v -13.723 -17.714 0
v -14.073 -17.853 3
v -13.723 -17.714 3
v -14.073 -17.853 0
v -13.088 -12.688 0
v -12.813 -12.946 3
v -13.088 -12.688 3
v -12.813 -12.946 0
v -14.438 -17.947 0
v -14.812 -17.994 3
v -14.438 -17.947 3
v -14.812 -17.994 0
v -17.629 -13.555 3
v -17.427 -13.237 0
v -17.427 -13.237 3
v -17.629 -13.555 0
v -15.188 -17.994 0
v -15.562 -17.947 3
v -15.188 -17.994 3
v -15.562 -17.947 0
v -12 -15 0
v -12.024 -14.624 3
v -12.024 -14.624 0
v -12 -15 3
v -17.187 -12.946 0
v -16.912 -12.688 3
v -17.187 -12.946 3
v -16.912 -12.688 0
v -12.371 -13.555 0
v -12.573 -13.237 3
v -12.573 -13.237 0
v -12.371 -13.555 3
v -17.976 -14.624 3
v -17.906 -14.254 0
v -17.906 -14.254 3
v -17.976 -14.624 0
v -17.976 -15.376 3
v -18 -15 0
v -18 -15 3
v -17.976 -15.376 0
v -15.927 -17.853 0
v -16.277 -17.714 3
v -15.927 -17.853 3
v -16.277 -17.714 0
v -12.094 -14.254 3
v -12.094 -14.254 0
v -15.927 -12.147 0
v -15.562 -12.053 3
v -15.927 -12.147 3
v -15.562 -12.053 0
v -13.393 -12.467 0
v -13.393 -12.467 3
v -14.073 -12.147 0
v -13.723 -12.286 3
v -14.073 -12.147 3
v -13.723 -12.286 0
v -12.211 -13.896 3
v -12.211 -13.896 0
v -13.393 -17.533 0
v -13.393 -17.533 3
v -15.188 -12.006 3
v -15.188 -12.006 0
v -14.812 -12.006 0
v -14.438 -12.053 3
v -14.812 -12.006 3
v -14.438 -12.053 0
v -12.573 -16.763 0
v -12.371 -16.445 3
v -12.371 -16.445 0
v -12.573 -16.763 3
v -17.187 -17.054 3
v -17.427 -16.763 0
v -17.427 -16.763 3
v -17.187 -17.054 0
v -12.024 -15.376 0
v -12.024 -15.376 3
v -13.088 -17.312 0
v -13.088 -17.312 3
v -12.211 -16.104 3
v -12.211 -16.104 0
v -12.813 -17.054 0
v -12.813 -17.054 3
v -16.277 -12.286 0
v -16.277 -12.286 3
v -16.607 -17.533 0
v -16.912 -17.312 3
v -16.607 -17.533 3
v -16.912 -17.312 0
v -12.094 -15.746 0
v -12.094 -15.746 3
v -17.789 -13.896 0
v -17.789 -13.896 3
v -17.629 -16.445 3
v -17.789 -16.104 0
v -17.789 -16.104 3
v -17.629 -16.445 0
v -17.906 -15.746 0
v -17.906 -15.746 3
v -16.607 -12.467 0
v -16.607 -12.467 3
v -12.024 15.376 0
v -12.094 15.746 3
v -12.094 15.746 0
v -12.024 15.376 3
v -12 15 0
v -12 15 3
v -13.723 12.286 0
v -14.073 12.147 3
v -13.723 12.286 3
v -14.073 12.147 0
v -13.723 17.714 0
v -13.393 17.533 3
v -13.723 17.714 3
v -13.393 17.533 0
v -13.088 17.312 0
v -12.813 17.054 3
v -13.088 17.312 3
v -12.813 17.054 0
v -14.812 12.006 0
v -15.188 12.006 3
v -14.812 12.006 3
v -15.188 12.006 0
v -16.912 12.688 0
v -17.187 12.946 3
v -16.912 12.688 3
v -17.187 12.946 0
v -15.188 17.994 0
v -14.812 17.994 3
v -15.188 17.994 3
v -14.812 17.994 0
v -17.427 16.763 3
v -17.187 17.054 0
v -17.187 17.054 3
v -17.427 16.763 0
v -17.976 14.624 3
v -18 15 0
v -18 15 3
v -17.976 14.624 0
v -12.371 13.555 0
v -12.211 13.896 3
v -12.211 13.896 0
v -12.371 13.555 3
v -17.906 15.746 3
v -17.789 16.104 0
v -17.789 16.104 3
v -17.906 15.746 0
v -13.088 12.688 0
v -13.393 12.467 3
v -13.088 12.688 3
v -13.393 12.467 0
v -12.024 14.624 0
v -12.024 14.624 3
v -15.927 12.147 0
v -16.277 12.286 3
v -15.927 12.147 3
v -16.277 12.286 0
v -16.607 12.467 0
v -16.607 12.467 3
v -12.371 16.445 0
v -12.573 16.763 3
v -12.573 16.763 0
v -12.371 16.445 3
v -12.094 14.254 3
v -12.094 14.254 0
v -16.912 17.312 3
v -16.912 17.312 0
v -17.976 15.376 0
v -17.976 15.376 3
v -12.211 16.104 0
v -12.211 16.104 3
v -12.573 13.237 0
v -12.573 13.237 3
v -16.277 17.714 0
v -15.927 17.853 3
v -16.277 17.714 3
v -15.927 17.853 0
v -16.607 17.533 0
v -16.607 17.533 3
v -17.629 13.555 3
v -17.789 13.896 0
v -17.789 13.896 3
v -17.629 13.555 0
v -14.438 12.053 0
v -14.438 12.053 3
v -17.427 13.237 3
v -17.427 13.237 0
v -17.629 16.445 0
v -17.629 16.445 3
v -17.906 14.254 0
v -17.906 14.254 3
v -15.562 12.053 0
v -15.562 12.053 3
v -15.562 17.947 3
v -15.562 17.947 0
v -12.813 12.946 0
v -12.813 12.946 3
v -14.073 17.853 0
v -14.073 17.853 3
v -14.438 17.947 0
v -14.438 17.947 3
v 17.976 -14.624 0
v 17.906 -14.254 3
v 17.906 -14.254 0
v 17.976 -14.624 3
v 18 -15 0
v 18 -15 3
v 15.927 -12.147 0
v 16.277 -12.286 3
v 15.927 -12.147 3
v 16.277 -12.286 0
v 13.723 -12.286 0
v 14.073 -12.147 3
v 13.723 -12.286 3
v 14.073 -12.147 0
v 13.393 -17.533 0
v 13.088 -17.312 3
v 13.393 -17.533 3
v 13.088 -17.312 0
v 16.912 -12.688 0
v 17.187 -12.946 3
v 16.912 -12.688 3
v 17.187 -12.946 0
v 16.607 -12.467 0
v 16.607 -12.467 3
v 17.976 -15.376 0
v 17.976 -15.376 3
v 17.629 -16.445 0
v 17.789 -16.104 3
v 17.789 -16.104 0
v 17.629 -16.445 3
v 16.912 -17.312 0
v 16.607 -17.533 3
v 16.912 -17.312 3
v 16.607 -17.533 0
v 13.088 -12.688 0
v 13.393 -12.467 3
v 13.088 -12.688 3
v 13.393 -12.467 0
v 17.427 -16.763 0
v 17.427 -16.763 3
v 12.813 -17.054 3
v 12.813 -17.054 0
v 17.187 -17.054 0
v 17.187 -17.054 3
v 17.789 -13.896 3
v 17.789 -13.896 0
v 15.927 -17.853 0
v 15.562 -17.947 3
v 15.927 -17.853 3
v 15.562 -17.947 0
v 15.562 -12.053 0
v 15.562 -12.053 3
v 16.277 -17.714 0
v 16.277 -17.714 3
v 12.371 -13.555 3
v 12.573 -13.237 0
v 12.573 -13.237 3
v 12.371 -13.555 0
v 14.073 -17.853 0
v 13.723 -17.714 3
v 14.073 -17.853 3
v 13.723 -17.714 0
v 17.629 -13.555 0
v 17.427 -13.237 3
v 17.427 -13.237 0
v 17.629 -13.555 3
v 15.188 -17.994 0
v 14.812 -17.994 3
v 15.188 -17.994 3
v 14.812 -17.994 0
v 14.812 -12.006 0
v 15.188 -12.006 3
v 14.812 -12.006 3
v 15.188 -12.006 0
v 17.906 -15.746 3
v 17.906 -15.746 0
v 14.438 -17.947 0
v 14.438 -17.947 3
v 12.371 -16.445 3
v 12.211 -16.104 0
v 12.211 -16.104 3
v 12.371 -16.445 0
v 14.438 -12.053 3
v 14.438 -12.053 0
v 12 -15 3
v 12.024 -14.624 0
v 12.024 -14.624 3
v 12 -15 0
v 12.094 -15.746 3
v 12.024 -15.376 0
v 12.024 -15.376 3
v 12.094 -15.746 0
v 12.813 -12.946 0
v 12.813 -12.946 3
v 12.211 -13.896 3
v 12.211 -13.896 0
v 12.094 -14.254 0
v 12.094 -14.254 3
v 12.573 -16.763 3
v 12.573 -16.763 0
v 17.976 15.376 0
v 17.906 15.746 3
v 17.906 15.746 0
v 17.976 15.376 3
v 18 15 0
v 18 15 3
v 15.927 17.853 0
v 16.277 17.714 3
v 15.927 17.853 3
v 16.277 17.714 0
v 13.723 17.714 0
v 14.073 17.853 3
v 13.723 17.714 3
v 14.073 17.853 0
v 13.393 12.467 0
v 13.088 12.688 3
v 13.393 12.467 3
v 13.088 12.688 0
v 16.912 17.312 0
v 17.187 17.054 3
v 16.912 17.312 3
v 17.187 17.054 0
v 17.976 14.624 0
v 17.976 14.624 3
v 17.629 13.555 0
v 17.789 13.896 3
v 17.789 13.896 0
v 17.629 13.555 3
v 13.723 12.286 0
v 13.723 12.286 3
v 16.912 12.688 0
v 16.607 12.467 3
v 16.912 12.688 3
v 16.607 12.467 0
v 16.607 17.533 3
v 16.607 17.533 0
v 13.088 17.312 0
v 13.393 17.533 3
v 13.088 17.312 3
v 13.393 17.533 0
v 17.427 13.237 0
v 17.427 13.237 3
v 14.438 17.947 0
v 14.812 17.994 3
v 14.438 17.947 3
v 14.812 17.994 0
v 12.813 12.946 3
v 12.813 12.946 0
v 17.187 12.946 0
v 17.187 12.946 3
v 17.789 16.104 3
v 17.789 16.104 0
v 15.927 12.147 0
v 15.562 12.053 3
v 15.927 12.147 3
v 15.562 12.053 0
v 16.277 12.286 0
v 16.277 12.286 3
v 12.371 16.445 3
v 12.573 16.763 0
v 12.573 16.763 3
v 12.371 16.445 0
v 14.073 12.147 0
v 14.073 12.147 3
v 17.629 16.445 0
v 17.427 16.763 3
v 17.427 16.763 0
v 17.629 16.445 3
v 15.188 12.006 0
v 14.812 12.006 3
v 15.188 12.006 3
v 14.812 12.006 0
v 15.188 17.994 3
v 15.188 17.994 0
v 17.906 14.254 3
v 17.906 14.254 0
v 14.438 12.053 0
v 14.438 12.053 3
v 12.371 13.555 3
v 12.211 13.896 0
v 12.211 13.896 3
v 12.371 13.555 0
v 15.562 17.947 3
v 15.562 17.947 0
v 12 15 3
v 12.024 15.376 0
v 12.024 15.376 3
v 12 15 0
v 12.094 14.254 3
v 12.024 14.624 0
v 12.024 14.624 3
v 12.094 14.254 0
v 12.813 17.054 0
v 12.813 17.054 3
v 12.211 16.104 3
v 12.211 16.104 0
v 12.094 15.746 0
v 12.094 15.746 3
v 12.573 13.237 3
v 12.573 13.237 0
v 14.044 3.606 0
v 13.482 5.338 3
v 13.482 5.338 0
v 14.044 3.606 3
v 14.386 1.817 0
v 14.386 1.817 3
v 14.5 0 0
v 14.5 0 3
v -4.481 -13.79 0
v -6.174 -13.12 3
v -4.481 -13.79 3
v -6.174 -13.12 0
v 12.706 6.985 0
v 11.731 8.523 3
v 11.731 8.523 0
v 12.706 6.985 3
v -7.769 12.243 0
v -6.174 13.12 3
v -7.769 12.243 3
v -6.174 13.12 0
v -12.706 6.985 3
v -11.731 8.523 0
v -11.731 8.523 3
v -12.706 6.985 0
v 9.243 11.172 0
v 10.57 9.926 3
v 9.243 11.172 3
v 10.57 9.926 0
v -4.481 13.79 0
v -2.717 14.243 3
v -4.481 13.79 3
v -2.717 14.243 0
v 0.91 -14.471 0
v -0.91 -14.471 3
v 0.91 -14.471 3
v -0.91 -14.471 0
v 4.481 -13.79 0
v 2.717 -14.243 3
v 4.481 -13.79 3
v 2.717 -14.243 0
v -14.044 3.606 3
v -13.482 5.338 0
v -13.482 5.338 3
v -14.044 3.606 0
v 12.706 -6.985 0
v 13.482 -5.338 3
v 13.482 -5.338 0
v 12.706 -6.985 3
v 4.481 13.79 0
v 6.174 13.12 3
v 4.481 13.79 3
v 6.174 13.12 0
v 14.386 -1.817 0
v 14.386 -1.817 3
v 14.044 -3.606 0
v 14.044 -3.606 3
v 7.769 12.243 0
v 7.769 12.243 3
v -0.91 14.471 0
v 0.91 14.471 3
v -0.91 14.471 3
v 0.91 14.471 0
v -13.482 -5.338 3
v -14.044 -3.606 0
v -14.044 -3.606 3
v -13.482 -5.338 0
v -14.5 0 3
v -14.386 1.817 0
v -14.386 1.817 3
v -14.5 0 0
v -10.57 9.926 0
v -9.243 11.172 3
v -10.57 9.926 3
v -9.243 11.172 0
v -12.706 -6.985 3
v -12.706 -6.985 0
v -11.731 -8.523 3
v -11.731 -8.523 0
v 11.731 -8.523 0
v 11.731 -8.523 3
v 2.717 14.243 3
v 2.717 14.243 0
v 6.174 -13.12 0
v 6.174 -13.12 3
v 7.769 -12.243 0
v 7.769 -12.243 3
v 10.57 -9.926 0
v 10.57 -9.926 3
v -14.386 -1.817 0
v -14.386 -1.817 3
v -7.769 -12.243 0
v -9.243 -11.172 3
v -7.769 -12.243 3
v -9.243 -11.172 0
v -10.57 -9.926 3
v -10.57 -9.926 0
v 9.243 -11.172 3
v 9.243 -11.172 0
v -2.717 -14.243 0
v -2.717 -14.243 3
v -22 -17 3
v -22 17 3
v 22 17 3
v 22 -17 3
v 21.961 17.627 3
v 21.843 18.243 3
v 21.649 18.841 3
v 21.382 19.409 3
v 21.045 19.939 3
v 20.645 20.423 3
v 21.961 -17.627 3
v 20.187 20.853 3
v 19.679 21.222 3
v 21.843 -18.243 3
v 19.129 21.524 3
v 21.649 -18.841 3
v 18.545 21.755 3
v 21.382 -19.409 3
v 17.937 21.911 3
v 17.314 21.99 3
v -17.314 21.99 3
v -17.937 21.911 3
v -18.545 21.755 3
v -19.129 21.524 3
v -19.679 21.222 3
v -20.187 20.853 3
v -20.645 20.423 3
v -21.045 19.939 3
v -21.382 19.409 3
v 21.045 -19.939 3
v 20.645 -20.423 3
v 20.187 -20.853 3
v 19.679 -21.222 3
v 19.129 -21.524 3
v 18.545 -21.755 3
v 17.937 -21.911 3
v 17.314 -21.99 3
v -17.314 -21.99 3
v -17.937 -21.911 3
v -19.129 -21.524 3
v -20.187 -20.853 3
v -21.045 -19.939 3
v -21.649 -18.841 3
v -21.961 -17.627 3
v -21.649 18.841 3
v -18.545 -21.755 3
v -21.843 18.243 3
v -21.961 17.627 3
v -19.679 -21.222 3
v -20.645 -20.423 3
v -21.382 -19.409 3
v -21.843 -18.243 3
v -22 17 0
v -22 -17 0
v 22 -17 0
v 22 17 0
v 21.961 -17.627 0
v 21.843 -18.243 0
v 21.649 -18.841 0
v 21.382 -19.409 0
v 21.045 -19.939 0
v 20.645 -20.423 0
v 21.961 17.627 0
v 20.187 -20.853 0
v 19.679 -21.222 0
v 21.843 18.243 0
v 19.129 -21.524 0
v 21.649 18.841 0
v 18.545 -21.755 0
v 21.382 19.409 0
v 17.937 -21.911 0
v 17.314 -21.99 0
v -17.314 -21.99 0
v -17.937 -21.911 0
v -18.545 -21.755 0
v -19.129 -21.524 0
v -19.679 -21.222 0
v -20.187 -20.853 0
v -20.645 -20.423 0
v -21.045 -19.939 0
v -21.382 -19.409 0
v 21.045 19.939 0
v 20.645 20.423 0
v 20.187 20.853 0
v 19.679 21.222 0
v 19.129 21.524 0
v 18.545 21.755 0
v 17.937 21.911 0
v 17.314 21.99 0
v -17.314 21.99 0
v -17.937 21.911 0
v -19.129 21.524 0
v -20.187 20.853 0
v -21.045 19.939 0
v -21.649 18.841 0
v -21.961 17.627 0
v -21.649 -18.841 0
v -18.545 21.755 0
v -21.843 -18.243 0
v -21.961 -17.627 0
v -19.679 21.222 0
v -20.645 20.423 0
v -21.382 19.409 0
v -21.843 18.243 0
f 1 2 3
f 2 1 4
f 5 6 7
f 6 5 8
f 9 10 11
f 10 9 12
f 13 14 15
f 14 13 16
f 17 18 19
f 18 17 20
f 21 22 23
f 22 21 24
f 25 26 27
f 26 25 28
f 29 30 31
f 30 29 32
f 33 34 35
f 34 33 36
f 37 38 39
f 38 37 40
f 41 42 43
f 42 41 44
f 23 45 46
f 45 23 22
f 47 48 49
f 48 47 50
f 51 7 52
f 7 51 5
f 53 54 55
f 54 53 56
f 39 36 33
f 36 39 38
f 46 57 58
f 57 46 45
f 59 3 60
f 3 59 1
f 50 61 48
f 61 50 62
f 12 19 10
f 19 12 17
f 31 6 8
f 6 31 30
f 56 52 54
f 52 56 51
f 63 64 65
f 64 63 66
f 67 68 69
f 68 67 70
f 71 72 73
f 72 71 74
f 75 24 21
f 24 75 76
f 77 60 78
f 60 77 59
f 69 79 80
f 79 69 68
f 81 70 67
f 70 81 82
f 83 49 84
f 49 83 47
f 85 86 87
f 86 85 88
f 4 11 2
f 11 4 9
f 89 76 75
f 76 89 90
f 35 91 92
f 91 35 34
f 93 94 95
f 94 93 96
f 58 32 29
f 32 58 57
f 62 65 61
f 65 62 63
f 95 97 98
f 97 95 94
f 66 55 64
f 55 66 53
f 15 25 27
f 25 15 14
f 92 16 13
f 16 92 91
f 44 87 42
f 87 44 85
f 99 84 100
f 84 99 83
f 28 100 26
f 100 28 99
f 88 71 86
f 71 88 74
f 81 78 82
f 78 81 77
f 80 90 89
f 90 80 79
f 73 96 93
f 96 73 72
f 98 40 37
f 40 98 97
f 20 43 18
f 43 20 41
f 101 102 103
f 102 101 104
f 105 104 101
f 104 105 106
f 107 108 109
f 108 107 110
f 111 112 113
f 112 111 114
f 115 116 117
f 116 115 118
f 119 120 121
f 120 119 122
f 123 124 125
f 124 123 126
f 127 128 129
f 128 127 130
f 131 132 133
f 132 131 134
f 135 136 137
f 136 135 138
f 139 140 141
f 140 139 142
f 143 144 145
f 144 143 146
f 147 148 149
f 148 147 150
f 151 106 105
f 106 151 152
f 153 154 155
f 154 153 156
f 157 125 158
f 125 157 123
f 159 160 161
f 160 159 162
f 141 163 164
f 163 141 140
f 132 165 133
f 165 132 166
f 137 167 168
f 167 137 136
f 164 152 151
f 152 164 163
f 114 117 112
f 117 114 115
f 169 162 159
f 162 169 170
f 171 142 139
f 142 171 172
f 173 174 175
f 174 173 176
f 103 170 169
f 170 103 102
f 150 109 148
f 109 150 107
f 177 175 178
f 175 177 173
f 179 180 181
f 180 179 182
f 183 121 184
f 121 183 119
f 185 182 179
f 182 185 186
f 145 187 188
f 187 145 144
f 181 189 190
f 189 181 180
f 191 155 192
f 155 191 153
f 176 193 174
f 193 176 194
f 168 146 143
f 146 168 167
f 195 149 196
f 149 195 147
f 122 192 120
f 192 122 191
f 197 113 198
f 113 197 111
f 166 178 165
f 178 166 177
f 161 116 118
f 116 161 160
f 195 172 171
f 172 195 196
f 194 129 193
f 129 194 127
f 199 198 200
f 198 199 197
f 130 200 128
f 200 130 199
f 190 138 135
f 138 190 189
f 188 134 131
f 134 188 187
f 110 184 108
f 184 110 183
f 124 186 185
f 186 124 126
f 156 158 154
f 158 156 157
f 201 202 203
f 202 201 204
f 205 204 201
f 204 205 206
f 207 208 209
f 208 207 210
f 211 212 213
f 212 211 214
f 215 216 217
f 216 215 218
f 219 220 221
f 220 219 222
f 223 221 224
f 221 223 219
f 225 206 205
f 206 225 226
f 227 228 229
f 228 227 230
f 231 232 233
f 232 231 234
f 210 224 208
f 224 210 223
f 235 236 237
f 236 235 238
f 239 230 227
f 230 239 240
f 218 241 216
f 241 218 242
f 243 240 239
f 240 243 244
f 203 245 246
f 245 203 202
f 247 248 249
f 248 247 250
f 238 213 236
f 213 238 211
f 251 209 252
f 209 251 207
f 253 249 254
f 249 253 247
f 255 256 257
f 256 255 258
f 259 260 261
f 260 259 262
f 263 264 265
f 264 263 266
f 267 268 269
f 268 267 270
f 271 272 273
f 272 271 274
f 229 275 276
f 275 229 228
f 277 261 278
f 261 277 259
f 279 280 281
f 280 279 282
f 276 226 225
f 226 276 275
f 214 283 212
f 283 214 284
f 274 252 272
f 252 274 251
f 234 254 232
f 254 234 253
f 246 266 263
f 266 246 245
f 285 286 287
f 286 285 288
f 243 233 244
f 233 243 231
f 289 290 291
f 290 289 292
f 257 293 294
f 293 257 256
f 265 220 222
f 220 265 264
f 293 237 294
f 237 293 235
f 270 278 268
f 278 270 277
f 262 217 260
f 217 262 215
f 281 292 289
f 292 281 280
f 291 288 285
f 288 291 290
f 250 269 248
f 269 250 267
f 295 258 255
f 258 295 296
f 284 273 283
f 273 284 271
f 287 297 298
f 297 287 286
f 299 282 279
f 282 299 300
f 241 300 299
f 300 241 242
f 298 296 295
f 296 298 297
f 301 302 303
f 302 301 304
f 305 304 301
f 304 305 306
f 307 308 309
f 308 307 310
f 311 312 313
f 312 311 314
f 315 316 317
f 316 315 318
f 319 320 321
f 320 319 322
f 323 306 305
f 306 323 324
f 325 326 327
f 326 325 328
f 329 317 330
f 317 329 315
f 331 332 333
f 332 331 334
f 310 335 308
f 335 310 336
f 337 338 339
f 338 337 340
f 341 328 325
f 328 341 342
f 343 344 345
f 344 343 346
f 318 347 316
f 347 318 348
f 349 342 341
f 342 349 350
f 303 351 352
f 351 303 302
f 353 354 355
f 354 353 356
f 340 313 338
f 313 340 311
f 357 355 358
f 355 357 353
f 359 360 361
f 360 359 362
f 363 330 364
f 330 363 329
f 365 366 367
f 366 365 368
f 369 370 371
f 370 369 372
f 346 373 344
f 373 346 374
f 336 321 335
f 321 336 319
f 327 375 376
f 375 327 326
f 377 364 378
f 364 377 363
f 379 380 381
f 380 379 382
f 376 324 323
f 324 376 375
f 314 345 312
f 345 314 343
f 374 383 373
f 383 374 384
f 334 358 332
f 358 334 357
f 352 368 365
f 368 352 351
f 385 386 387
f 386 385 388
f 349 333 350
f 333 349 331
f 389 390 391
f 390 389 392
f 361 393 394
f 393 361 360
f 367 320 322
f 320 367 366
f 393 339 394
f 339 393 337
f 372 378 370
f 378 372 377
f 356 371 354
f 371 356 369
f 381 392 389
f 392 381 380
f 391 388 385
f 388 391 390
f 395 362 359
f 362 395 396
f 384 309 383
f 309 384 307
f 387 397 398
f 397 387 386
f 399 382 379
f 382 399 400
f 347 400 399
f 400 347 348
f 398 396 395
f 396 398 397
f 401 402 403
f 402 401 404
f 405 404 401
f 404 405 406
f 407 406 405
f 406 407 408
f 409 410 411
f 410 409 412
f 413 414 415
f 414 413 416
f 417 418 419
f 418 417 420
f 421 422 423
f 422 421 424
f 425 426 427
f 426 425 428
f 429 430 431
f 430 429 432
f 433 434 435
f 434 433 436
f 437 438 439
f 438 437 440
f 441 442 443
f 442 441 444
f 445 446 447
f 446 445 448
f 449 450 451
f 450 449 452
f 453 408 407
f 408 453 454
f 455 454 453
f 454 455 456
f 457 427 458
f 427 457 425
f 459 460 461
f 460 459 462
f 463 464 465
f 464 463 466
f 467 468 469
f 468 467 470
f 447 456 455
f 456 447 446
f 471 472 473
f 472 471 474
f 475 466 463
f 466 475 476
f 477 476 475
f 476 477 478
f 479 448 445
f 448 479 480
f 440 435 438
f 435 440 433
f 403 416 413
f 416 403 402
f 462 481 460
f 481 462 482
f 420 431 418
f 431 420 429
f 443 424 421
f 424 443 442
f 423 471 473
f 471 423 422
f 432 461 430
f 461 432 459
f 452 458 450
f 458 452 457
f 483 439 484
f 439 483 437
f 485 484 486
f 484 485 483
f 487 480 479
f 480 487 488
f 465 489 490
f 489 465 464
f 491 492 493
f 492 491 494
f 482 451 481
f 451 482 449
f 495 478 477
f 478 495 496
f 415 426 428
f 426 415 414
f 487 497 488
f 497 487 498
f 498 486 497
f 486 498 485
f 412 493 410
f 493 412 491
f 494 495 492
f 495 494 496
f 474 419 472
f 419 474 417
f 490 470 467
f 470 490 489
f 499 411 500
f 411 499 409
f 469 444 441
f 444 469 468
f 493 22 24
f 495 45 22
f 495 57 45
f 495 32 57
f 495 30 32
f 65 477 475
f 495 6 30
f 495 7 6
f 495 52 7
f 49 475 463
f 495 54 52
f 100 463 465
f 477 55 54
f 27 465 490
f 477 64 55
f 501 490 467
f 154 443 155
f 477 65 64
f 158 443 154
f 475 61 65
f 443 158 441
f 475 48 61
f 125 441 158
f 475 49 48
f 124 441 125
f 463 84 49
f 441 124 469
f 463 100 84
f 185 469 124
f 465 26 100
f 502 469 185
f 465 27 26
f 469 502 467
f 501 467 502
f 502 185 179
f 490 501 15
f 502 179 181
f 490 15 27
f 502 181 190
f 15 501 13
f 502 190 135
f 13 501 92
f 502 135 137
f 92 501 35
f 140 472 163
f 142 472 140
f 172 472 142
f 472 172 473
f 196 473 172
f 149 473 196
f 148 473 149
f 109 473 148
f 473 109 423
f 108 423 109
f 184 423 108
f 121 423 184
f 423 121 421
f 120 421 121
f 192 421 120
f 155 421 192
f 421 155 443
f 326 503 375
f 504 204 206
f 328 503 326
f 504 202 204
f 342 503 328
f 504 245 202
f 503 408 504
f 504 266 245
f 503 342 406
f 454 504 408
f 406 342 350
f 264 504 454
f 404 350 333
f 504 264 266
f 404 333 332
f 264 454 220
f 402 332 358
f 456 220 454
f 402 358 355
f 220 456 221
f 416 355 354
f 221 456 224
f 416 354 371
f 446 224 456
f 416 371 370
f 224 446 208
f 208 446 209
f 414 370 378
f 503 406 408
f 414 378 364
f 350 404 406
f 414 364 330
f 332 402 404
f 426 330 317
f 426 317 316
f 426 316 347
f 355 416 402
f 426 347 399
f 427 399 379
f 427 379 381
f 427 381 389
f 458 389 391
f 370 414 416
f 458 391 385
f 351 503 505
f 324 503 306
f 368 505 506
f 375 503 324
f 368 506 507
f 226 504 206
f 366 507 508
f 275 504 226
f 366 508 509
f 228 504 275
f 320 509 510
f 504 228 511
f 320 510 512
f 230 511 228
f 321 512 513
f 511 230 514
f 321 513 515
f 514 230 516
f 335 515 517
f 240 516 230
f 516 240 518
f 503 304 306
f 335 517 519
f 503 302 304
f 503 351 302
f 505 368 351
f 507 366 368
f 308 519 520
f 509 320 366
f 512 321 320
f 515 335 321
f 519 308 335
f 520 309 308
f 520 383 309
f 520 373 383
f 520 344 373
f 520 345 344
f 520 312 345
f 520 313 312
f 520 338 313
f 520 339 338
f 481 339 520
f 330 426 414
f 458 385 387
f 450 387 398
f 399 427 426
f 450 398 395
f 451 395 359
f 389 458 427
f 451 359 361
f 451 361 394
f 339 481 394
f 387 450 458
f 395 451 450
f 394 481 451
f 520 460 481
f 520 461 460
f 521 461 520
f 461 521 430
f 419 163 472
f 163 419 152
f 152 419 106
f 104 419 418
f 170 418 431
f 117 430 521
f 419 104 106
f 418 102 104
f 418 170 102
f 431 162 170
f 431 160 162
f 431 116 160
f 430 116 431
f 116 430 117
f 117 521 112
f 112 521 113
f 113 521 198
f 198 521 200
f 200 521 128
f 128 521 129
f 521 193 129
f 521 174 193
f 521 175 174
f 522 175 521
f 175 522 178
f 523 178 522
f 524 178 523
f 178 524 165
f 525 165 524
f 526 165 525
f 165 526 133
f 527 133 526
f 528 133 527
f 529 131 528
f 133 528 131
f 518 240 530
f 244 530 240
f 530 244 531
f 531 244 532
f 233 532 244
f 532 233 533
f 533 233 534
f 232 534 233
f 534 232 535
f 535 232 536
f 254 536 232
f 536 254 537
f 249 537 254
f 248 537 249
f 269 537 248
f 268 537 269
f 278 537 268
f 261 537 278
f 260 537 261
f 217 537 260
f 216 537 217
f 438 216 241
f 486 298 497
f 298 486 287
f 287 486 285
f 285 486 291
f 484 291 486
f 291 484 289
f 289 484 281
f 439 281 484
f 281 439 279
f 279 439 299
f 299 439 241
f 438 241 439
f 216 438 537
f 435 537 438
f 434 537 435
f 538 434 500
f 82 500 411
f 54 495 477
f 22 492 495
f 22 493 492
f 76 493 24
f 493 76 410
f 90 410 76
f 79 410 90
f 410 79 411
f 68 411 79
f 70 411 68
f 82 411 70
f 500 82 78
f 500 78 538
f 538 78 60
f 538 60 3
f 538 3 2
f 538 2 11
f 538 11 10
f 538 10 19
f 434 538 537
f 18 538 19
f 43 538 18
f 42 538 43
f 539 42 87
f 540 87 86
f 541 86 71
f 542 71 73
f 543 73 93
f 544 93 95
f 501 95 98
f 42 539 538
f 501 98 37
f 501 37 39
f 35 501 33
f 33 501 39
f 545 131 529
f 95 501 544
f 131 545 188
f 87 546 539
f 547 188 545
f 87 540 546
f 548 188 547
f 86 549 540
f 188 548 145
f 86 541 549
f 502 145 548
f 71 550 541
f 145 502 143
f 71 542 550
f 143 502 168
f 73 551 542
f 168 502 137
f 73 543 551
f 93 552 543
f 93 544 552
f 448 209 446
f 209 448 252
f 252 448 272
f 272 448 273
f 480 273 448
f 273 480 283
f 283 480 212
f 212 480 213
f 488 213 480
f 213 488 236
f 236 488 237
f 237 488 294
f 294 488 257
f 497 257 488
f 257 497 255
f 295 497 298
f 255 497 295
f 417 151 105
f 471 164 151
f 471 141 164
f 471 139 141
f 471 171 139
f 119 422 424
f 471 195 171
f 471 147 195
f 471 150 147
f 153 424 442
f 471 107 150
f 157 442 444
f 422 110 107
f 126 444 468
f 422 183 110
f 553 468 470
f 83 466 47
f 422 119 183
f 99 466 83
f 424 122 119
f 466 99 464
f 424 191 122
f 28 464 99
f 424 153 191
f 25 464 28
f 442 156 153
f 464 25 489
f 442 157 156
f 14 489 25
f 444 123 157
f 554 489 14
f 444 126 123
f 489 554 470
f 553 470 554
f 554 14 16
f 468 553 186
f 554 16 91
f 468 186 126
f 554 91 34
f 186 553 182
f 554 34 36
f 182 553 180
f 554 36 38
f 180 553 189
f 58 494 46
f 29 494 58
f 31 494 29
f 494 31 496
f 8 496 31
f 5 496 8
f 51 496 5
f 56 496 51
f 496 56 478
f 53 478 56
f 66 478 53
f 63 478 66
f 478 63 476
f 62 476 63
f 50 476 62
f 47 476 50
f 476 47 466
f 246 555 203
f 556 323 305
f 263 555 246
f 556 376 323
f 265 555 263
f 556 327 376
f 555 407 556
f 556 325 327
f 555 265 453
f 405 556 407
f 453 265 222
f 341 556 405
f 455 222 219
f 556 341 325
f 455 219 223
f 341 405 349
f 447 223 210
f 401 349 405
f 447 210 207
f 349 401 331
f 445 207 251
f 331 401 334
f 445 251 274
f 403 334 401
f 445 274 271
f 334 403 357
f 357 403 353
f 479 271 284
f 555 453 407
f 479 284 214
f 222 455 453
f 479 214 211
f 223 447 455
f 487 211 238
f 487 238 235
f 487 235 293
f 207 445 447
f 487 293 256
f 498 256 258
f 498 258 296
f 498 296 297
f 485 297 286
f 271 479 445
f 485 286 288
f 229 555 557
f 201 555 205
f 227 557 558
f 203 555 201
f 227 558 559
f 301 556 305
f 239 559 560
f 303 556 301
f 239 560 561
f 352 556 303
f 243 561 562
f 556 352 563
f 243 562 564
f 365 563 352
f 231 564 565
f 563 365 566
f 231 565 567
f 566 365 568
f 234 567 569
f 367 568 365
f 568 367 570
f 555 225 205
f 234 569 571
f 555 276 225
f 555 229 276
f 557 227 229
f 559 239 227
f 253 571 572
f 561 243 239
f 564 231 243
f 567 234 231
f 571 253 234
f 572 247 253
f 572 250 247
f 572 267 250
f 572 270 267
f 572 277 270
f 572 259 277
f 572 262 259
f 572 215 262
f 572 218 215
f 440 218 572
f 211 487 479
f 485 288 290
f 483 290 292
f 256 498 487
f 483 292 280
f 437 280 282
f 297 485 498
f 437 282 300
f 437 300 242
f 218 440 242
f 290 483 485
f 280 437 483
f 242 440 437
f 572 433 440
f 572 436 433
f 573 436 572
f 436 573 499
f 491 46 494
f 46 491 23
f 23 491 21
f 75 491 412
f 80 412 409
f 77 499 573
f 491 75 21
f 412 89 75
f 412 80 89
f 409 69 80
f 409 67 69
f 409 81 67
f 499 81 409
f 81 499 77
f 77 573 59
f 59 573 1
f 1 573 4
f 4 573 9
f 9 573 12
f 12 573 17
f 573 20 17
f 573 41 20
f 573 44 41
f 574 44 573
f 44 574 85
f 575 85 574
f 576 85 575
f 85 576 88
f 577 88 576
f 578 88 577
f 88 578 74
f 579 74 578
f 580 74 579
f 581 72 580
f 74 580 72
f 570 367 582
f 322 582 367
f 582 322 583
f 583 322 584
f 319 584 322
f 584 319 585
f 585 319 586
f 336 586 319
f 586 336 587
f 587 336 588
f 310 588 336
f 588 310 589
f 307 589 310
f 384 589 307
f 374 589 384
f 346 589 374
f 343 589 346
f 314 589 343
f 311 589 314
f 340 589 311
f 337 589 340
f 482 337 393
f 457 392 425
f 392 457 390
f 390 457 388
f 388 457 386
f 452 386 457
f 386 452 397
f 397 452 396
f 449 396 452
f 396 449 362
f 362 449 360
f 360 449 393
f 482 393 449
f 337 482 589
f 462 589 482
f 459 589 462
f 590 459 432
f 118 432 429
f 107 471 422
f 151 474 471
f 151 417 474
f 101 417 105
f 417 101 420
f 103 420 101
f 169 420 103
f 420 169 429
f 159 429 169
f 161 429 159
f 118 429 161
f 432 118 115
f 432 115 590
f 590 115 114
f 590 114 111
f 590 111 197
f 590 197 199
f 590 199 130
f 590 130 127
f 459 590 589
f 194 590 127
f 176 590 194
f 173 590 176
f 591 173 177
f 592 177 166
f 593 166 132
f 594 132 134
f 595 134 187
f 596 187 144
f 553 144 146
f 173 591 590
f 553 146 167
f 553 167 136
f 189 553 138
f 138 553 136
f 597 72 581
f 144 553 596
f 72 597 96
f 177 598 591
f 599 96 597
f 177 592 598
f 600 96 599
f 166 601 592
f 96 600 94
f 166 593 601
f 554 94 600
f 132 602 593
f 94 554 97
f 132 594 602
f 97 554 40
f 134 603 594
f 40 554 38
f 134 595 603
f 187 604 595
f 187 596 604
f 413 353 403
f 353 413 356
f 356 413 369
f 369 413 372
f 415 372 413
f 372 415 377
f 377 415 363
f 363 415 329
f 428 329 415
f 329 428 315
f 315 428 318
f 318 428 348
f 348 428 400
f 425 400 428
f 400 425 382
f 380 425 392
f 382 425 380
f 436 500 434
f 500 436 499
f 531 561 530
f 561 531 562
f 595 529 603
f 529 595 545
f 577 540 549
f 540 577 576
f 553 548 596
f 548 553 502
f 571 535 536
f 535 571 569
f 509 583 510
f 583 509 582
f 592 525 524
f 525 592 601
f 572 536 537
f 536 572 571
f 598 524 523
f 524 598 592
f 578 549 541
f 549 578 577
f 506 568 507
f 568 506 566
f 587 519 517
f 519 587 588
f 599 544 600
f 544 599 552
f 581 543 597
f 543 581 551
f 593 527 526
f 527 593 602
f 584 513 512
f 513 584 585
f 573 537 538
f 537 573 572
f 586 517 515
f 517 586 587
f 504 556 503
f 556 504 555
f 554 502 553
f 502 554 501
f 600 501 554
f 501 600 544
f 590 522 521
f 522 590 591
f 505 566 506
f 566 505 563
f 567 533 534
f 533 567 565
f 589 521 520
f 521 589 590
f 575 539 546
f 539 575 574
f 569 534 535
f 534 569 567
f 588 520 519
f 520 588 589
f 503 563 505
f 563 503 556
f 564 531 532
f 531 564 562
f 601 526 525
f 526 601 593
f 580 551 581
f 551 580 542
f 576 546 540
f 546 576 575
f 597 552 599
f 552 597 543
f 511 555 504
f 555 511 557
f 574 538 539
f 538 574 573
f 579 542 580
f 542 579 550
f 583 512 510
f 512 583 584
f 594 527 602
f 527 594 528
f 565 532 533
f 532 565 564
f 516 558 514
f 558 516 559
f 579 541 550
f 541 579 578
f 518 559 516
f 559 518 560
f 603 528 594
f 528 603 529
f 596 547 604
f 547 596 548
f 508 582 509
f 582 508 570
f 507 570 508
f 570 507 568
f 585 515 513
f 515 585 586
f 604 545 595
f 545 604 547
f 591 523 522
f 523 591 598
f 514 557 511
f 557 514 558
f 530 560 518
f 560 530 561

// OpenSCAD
$fn = 50;


difference() {
	union() {
		hull() {
			translate(v = [-17.0000000000, 17.0000000000, 0]) {
				cylinder(h = 3, r = 5);
			}
			translate(v = [17.0000000000, 17.0000000000, 0]) {
				cylinder(h = 3, r = 5);
			}
			translate(v = [-17.0000000000, -17.0000000000, 0]) {
				cylinder(h = 3, r = 5);
			}
			translate(v = [17.0000000000, -17.0000000000, 0]) {
				cylinder(h = 3, r = 5);
			}
		}
	}
	union() {
		#translate(v = [-15.0000000000, -15.0000000000, -100.0000000000]) {
			cylinder(h = 200, r = 3.0000000000);
		}
		#translate(v = [-15.0000000000, 15.0000000000, -100.0000000000]) {
			cylinder(h = 200, r = 3.0000000000);
		}
		#translate(v = [15.0000000000, -15.0000000000, -100.0000000000]) {
			cylinder(h = 200, r = 3.0000000000);
		}
		#translate(v = [15.0000000000, 15.0000000000, -100.0000000000]) {
			cylinder(h = 200, r = 3.0000000000);
		}
		#cylinder(h = 3, r = 14.5000000000);
	}
}
